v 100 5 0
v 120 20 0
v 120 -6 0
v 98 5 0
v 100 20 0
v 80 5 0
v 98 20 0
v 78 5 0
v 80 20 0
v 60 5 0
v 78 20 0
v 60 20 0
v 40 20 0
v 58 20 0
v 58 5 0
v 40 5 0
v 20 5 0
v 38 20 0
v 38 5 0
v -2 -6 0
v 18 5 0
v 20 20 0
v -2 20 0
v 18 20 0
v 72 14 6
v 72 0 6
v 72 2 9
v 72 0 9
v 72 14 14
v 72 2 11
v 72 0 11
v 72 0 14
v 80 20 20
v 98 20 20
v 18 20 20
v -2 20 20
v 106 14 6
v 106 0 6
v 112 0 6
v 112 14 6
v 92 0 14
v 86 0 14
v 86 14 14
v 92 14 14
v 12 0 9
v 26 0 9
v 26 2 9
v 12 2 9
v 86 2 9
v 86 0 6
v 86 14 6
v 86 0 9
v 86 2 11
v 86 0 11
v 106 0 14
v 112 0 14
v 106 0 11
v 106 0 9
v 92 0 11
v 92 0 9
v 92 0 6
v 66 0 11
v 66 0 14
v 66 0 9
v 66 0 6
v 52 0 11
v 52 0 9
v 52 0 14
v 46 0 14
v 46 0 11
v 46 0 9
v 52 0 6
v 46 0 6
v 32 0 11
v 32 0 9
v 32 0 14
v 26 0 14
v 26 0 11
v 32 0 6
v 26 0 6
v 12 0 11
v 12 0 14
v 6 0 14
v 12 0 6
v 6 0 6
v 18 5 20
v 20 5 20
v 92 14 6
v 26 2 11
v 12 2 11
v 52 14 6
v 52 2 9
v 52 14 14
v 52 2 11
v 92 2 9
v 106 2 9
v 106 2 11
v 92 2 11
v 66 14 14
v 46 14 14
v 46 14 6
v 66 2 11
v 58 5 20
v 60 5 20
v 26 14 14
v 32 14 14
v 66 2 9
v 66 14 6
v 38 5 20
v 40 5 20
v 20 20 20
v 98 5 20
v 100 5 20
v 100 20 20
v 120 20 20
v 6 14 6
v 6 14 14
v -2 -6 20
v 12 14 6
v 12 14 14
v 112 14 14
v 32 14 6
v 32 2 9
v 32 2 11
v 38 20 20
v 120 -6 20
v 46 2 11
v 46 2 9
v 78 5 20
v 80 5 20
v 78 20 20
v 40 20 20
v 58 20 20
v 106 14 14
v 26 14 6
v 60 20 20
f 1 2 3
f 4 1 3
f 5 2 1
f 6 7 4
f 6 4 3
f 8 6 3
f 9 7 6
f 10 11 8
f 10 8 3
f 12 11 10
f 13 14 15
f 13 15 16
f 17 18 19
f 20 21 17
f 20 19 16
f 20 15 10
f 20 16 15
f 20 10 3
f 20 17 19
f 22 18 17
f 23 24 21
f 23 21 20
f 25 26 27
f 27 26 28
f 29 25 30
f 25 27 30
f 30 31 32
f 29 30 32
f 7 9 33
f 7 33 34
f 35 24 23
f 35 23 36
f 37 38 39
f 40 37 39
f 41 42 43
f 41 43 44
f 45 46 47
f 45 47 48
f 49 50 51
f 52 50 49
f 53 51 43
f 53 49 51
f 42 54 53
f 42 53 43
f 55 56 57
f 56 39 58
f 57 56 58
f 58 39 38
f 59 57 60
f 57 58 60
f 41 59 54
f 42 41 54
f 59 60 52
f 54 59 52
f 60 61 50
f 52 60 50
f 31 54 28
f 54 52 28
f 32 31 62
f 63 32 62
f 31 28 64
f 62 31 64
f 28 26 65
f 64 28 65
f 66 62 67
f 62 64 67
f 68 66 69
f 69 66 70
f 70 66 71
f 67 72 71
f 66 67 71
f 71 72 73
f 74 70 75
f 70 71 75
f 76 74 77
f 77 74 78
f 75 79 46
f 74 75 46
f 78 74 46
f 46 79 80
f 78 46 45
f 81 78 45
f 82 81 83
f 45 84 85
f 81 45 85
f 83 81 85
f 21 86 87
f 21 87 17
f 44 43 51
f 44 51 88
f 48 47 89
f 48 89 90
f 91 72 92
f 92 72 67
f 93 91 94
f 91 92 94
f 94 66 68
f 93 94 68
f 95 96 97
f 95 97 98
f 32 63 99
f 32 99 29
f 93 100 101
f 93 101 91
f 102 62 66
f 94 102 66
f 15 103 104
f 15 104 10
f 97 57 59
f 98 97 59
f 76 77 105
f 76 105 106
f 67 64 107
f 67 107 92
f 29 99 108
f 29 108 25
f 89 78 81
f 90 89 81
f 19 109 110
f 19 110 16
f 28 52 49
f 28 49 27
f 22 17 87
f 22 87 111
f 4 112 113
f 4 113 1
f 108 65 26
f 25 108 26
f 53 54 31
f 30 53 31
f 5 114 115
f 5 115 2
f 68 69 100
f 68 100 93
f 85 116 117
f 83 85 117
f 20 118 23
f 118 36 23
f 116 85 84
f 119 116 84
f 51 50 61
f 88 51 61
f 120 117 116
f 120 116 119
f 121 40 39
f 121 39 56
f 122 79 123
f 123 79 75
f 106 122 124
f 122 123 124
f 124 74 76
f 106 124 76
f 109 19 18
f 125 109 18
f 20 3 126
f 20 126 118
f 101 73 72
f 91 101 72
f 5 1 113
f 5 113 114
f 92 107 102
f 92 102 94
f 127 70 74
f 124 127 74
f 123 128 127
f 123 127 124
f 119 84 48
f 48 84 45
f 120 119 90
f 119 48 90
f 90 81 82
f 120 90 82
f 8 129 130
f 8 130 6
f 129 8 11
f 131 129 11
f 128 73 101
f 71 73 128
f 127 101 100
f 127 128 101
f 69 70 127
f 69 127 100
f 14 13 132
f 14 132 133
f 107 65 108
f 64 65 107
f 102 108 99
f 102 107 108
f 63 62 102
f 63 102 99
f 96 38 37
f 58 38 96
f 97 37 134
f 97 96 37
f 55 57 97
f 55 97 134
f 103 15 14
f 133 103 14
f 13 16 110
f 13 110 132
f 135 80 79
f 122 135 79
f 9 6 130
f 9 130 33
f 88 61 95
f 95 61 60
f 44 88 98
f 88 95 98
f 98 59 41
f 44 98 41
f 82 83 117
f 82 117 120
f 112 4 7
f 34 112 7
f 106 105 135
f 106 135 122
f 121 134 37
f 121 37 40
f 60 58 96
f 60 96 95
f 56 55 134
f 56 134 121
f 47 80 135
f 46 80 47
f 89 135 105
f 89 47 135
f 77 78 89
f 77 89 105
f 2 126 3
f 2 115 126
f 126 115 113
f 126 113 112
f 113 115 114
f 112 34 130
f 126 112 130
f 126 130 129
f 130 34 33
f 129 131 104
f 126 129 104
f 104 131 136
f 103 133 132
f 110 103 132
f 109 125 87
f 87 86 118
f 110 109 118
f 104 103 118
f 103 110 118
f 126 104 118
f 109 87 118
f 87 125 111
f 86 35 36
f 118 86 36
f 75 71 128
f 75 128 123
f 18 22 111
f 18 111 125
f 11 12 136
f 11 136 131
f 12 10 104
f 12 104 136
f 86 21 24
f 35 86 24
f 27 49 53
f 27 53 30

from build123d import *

# Parameters (mm, degrees)
SKETCH1_W           = 18
SKETCH1_H           = 20
BOSS_EXTRUDE1_DEPTH = 20
SKETCH2_W           = 6
SKETCH2_H           = 8
CUT_EXTRUDE1_DEPTH  = 14
SKETCH3_W           = 20
SKETCH3_H           = 5
BOSS_EXTRUDE2_DEPTH = 2
LPATTERN1_COUNT     = 6
LPATTERN1_PITCH     = 20
SKETCH4_W           = 20
SKETCH4_H           = 15
BOSS_EXTRUDE3_DEPTH = 2
SKETCH5_W           = 20
SKETCH5_H           = 20
BOSS_EXTRUDE4_DEPTH = 2
SKETCH7_W           = 106
SKETCH7_H           = 2
CUT_EXTRUDE2_DEPTH  = 2
SKETCH8_W           = 122
SKETCH8_H           = 20
BOSS_EXTRUDE5_DEPTH = 6


with BuildPart() as part:
    # Sketch1 → Boss-Extrude1 (new body)
    with BuildSketch(Plane.XY):
        with Locations((9, 10)):
            Rectangle(SKETCH1_W, SKETCH1_H)
    extrude(amount=BOSS_EXTRUDE1_DEPTH)

    # Sketch2 → Cut-Extrude1 (cut)
    with BuildSketch(Plane.XZ):
        with Locations((9, 10)):
            Rectangle(SKETCH2_W, SKETCH2_H)
    extrude(amount=-CUT_EXTRUDE1_DEPTH, mode=Mode.SUBTRACT)

    # Sketch3 → Boss-Extrude2 (add)
    with BuildSketch(Plane(origin=(18, 0, 0), x_dir=(0, 0, -1), z_dir=(1, 0, 0))):
        with Locations((-10, 2.5)):
            Rectangle(SKETCH3_W, SKETCH3_H)
    extrude(amount=BOSS_EXTRUDE2_DEPTH)


with BuildPart() as lpattern1_1:
    # LPattern1: pattern copy
    add(part.part.moved(Location(Vector(1, 0, 0) * (1 * LPATTERN1_PITCH))))


with BuildPart() as lpattern1_2:
    # LPattern1: pattern copy
    add(part.part.moved(Location(Vector(1, 0, 0) * (2 * LPATTERN1_PITCH))))


with BuildPart() as lpattern1_3:
    # LPattern1: pattern copy
    add(part.part.moved(Location(Vector(1, 0, 0) * (3 * LPATTERN1_PITCH))))


with BuildPart() as lpattern1_4:
    # LPattern1: pattern copy
    add(part.part.moved(Location(Vector(1, 0, 0) * (4 * LPATTERN1_PITCH))))


with BuildPart() as lpattern1_5:
    # LPattern1: pattern copy
    add(part.part.moved(Location(Vector(1, 0, 0) * (5 * LPATTERN1_PITCH))))

    # Sketch4 → Boss-Extrude3 (add)
    with BuildSketch(Plane(origin=(118, 0, 0), x_dir=(0, 0, -1), z_dir=(1, 0, 0))):
        with Locations((-10, 12.5)):
            Rectangle(SKETCH4_W, SKETCH4_H)
    extrude(amount=BOSS_EXTRUDE3_DEPTH)


with BuildPart() as part_1:
    add(part.part)

    # Sketch5 → Boss-Extrude4 (add)
    with BuildSketch(Plane.ZY):
        with Locations((10, 10)):
            Rectangle(SKETCH5_W, SKETCH5_H)
    extrude(amount=BOSS_EXTRUDE4_DEPTH)


with BuildPart() as lpattern1_1_1:
    add(lpattern1_1.part)

    # Combine1: union LPattern1_2, LPattern1_3, LPattern1_4, LPattern1_5, part
    add(lpattern1_2.part)
    add(lpattern1_3.part)
    add(lpattern1_4.part)
    add(lpattern1_5.part)
    add(part_1.part)

    # Sketch7 → Cut-Extrude2 (cut)
    with BuildSketch(Plane(origin=(0, 0, 0), x_dir=(-1, 0, 0), z_dir=(0, -1, 0))):
        with Locations((-59, -10)):
            Rectangle(SKETCH7_W, SKETCH7_H)
    extrude(amount=-CUT_EXTRUDE2_DEPTH, mode=Mode.SUBTRACT)

    # Sketch8 → Boss-Extrude5 (add)
    with BuildSketch(Plane(origin=(0, 0, 0), x_dir=(-1, 0, 0), z_dir=(0, -1, 0))):
        with Locations((-59, -10)):
            Rectangle(SKETCH8_W, SKETCH8_H)
    extrude(amount=BOSS_EXTRUDE5_DEPTH)


solid = lpattern1_1_1.part
